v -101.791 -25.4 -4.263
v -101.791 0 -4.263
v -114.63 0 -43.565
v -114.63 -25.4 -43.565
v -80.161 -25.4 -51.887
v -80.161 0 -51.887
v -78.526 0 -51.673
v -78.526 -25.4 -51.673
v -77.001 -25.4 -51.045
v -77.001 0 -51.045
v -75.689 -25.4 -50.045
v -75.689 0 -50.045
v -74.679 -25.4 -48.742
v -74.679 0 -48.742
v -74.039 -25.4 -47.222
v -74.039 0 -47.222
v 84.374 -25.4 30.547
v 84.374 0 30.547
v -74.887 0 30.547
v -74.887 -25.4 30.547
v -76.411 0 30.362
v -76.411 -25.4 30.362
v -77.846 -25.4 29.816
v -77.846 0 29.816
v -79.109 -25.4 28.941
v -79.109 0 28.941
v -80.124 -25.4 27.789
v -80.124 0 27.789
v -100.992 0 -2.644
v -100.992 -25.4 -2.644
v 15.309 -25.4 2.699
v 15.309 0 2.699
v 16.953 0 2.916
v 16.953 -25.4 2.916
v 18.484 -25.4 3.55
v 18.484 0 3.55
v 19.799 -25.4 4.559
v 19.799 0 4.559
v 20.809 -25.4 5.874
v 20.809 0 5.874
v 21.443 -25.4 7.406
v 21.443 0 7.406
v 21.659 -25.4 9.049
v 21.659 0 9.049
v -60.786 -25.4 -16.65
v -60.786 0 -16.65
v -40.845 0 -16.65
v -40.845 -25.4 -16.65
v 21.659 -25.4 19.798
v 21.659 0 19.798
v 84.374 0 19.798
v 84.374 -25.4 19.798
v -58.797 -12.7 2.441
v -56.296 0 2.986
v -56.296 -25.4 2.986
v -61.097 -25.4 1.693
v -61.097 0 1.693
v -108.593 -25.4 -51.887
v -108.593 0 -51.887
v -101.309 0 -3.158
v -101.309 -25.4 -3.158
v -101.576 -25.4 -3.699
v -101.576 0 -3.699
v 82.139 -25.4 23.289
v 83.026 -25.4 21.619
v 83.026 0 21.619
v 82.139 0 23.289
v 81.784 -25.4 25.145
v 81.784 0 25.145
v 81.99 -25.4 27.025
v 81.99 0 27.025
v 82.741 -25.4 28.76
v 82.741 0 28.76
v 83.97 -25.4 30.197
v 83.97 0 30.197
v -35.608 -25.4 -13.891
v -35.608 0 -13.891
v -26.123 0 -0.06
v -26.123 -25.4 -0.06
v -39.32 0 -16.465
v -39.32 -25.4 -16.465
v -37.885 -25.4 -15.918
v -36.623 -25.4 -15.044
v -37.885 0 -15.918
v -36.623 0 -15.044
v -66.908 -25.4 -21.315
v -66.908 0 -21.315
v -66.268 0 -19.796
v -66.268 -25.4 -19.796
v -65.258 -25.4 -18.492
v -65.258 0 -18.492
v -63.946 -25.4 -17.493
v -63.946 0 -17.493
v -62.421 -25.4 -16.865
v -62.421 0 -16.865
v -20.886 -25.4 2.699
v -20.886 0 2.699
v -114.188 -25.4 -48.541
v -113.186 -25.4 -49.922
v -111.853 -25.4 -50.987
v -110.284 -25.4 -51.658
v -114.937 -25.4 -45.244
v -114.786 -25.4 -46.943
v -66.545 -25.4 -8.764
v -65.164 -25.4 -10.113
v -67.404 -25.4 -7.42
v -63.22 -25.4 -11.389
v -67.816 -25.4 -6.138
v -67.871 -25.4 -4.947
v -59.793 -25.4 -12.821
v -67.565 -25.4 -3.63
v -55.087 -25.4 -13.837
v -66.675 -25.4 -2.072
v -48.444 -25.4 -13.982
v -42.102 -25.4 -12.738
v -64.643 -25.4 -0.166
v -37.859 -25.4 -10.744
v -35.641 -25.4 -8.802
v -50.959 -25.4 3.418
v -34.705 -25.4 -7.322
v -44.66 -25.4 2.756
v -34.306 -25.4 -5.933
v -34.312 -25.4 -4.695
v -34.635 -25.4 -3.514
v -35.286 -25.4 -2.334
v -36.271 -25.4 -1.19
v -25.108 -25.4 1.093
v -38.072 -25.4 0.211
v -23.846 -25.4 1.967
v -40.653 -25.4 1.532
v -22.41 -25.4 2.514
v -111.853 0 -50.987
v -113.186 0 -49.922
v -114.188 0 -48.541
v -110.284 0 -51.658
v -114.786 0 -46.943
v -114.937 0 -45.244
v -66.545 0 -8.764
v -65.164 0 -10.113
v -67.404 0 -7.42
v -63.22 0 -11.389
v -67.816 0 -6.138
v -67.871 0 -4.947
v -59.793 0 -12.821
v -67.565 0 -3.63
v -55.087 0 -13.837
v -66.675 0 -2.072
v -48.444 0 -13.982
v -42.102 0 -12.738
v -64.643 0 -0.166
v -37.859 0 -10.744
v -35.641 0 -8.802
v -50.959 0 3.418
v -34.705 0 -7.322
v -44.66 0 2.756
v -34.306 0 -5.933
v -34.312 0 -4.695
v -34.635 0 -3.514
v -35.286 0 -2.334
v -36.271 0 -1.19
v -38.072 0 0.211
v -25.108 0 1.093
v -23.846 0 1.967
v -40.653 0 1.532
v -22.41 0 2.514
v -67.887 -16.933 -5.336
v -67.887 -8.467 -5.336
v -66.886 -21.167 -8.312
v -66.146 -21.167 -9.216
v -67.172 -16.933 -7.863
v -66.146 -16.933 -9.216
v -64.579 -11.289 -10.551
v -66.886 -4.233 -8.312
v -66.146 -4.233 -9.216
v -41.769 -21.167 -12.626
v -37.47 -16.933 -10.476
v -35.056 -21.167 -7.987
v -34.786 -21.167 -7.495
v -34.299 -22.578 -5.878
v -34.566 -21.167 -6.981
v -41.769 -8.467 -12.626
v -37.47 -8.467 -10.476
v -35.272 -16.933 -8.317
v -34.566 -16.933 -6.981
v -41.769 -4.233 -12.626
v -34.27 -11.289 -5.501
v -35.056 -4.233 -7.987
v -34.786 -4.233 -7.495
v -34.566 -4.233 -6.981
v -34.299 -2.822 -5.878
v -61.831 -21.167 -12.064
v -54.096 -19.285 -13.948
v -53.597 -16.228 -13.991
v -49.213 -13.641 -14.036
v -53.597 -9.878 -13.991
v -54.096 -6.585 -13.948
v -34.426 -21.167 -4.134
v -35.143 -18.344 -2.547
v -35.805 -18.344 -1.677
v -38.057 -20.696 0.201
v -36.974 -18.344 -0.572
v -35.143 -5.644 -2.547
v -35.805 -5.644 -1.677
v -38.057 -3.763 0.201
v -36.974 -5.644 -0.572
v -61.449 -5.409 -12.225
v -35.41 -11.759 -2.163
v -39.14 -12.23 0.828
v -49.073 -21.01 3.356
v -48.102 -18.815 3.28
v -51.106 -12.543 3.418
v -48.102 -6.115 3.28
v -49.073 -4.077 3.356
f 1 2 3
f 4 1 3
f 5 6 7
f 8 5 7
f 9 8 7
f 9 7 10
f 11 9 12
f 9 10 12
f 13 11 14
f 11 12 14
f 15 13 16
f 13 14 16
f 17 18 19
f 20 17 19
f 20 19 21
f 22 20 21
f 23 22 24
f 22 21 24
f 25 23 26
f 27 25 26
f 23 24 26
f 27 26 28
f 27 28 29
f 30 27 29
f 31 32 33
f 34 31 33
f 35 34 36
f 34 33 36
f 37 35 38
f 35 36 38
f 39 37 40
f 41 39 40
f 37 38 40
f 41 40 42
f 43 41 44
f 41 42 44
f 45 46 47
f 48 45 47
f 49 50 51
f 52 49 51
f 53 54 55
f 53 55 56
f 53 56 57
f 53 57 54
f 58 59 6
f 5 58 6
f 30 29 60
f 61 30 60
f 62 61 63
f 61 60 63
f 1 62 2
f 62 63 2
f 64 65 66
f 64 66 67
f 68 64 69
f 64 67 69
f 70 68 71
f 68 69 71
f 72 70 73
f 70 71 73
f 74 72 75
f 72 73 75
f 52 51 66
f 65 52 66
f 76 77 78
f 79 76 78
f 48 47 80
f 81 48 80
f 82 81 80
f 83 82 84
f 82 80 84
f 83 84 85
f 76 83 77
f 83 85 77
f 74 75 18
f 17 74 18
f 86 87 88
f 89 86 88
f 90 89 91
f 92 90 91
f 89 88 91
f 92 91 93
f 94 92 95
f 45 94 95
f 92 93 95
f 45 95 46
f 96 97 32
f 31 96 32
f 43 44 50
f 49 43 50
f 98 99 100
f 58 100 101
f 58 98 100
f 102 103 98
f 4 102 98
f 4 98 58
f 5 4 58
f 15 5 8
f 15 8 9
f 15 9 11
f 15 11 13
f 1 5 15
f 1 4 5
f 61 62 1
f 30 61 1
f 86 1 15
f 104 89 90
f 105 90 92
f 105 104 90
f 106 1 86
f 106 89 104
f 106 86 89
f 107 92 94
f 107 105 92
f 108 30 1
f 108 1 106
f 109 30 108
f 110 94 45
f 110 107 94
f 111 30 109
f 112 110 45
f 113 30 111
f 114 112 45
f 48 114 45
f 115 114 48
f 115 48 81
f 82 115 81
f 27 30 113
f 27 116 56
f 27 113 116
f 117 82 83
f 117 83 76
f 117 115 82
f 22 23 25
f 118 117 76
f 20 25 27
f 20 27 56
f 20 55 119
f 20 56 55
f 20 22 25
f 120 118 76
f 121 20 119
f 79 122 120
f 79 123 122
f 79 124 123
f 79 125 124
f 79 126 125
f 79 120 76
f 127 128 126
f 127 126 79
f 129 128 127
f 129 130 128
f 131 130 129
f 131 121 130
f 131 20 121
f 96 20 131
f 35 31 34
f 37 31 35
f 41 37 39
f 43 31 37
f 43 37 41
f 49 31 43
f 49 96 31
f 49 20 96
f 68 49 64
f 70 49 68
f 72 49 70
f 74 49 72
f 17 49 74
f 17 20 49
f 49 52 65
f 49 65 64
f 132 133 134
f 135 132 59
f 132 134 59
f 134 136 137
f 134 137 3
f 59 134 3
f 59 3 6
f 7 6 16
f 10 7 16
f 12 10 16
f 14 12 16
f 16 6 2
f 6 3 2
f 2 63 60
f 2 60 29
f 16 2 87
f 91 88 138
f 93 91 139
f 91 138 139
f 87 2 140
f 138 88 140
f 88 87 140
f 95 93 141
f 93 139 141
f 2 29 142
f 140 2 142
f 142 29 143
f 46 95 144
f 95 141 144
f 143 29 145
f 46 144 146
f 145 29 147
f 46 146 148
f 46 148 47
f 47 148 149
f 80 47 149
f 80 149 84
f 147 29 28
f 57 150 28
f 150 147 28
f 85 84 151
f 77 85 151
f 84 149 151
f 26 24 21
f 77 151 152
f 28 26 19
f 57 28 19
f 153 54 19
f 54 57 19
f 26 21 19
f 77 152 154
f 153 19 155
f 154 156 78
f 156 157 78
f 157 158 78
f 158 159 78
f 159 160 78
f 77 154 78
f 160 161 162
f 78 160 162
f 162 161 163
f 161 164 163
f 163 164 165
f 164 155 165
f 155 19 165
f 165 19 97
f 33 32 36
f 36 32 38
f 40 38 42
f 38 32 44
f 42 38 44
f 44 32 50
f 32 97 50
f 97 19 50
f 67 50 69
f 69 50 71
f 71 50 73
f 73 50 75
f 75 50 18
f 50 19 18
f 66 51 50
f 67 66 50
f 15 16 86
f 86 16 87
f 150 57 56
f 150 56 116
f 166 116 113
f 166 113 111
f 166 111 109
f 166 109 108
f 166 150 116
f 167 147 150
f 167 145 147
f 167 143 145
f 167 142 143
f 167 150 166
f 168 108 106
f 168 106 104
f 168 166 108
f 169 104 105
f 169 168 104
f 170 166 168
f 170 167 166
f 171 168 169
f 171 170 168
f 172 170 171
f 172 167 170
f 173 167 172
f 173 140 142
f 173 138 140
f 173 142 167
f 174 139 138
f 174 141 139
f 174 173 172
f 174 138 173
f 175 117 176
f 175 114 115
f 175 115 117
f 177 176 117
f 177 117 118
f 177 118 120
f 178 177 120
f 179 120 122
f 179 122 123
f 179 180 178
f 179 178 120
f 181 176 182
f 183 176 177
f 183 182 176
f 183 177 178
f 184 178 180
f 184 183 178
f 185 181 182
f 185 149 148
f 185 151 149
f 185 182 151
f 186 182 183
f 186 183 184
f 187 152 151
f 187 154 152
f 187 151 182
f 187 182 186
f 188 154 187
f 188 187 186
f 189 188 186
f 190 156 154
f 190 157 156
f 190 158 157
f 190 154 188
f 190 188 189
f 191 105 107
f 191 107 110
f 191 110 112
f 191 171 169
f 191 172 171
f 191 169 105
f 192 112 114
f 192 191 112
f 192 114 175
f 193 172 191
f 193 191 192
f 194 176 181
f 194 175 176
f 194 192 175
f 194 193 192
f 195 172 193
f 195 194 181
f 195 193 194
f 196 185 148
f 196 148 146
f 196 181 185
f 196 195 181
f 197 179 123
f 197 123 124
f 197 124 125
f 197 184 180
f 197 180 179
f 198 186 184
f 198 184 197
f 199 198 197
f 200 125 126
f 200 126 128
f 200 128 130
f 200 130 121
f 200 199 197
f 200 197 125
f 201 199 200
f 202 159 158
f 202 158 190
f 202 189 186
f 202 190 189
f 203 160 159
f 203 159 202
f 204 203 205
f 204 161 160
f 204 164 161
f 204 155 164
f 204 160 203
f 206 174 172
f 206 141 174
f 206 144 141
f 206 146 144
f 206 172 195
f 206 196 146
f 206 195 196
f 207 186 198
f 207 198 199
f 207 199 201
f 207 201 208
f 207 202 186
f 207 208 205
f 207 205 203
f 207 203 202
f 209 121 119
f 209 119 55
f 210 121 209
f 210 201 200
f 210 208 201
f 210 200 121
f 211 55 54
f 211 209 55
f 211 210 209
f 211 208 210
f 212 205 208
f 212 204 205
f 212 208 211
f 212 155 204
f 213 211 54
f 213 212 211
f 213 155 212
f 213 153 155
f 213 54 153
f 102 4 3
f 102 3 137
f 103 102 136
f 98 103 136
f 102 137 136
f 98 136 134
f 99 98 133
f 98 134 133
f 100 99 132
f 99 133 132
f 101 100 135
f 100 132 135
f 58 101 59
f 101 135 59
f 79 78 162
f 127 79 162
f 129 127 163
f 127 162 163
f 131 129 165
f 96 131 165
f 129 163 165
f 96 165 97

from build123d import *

# Parameters (mm, degrees)
F1_DEPTH = 25.4
F3_DEPTH = 25.4
F4_DEPTH = 25.4


# Not quite as in the source:
# - a feature names something its author has since deleted; it is built from what else it names


with BuildPart() as f1:
    # F0 (on Front) → F1 (new body)
    with BuildSketch(Plane.XZ):
        with BuildLine():
            Line((84.3741819263, 30.5474363267), (21.6592755169, 30.5474363267))
            Line((21.6592755169, 30.5474363267), (21.6592755169, 19.7983730762))
            Line((21.6592755169, 19.7983730762), (84.3741819263, 19.7983730762))
            Line((84.3741819263, 19.7983730762), (83.0258661007, 21.6186676974))
            ThreePointArc((83.0258661007, 21.6186676974), (81.8166137912, 26.0927593628), (83.9697137101, 30.196897289))
            Line((83.9697137101, 30.196897289), (84.3741819263, 30.5474363267))
        make_face()
        with BuildLine():
            Line((21.6592755169, 19.7983730762), (21.6592755169, 30.5474363267))
            Line((21.6592755169, 30.5474363267), (-74.8867837768, 30.5474363267))
            ThreePointArc((-74.8867837768, 30.5474363267), (-77.8464272175, 29.8155330422), (-80.1238115226, 27.7885420603))
            Line((-80.1238115226, 27.7885420603), (-100.9918020349, -2.643935684))
            ThreePointArc((-100.9918020349, -2.643935684), (-101.4491934819, -3.425043187), (-101.7908767788, -4.2632486461))
            Line((-101.7908767788, -4.2632486461), (-114.6295490787, -43.5653208295))
            ThreePointArc((-114.6295490787, -43.5653208295), (-113.7336500917, -49.2654923305), (-108.593446589, -51.887113601))
            Line((-108.593446589, -51.887113601), (-80.1609597975, -51.887113601))
            ThreePointArc((-80.1609597975, -51.887113601), (-76.3124250948, -50.5879828967), (-74.0386146752, -47.2221626222))
            Line((-74.0386146752, -47.2221626222), (-66.9082951101, -21.3153334082))
            ThreePointArc((-66.9082951101, -21.3153334082), (-64.6344846905, -17.9495131337), (-60.7859499878, -16.6503824294))
            Line((-60.7859499878, -16.6503824294), (-40.8448504228, -16.6503824294))
            ThreePointArc((-40.8448504228, -16.6503824294), (-37.8852069821, -15.9184791448), (-35.607822677, -13.8914881629))
            Line((-35.607822677, -13.8914881629), (-26.1230860721, -0.0595844409))
            ThreePointArc((-26.1230860721, -0.0595844409), (-23.845701767, 1.967406541), (-20.8860583263, 2.6993098256))
            Line((-20.8860583263, 2.6993098256), (15.3092755169, 2.6993098256))
            ThreePointArc((15.3092755169, 2.6993098256), (19.7994035774, 4.5591817651), (21.6592755169, 9.0493098256))
            Line((21.6592755169, 9.0493098256), (21.6592755169, 19.7983730762))
        make_face()
    extrude(amount=F1_DEPTH)

    # F2 (on Front) → F3 (join)
    with BuildSketch(Plane.XZ):
        with BuildLine():
            add(Edge.make_bspline(
                [(-61.0972069937, 1.6932484379), (-67.8872726858, -0.9318532182), (-67.8872726858, -5.3358376026)],
                knots=[5.35099187, 5.35099187, 5.35099187, 6.2831853072, 6.2831853072, 6.2831853072], degree=2, weights=[1, 0.8933292345, 1]))
            add(Edge.make_bspline(
                [(-67.8872726858, -5.3358376026), (-67.8872726858, -32.3137216), (-37.4698541145, -10.4760980565), (-7.0524355433, 11.3615254871), (-56.2960408601, 2.9858730785)],
                knots=[0, 0, 0, 2.5140348645, 2.5140348645, 5.028069729, 5.028069729, 5.028069729], degree=2, weights=[1, 0.3086552179, 1, 0.3086552179, 1]))
            Line((-56.2960408601, 2.9858730785), (-51.4948747264, -11.1421316456))
            Line((-51.4948747264, -11.1421316456), (-61.0972069937, 1.6932484379))
        make_face()
        with BuildLine():
            Line((-51.4948747264, -11.1421316456), (-56.2960408601, 2.9858730785))
            add(Edge.make_bspline(
                [(-56.2960408601, 2.9858730785), (-58.8987667134, 2.5431856082), (-61.0972069937, 1.6932484379)],
                knots=[5.028069729, 5.028069729, 5.028069729, 5.35099187, 5.35099187, 5.35099187], degree=2, weights=[1, 0.9869934546, 1]))
            Line((-61.0972069937, 1.6932484379), (-51.4948747264, -11.1421316456))
        make_face()
    extrude(amount=F3_DEPTH)

    # F2 (on Front) → F4 (cut)
    with BuildSketch(Plane.XZ):
        with BuildLine():
            add(Edge.make_bspline(
                [(-61.0972069937, 1.6932484379), (-67.8872726858, -0.9318532182), (-67.8872726858, -5.3358376026)],
                knots=[5.35099187, 5.35099187, 5.35099187, 6.2831853072, 6.2831853072, 6.2831853072], degree=2, weights=[1, 0.8933292345, 1]))
            add(Edge.make_bspline(
                [(-67.8872726858, -5.3358376026), (-67.8872726858, -32.3137216), (-37.4698541145, -10.4760980565), (-7.0524355433, 11.3615254871), (-56.2960408601, 2.9858730785)],
                knots=[0, 0, 0, 2.5140348645, 2.5140348645, 5.028069729, 5.028069729, 5.028069729], degree=2, weights=[1, 0.3086552179, 1, 0.3086552179, 1]))
            Line((-56.2960408601, 2.9858730785), (-51.4948747264, -11.1421316456))
            Line((-51.4948747264, -11.1421316456), (-61.0972069937, 1.6932484379))
        make_face()
        with BuildLine():
            Line((-51.4948747264, -11.1421316456), (-56.2960408601, 2.9858730785))
            add(Edge.make_bspline(
                [(-56.2960408601, 2.9858730785), (-58.8987667134, 2.5431856082), (-61.0972069937, 1.6932484379)],
                knots=[5.028069729, 5.028069729, 5.028069729, 5.35099187, 5.35099187, 5.35099187], degree=2, weights=[1, 0.9869934546, 1]))
            Line((-61.0972069937, 1.6932484379), (-51.4948747264, -11.1421316456))
        make_face()
    extrude(amount=F4_DEPTH, mode=Mode.SUBTRACT)


solid = f1.part
